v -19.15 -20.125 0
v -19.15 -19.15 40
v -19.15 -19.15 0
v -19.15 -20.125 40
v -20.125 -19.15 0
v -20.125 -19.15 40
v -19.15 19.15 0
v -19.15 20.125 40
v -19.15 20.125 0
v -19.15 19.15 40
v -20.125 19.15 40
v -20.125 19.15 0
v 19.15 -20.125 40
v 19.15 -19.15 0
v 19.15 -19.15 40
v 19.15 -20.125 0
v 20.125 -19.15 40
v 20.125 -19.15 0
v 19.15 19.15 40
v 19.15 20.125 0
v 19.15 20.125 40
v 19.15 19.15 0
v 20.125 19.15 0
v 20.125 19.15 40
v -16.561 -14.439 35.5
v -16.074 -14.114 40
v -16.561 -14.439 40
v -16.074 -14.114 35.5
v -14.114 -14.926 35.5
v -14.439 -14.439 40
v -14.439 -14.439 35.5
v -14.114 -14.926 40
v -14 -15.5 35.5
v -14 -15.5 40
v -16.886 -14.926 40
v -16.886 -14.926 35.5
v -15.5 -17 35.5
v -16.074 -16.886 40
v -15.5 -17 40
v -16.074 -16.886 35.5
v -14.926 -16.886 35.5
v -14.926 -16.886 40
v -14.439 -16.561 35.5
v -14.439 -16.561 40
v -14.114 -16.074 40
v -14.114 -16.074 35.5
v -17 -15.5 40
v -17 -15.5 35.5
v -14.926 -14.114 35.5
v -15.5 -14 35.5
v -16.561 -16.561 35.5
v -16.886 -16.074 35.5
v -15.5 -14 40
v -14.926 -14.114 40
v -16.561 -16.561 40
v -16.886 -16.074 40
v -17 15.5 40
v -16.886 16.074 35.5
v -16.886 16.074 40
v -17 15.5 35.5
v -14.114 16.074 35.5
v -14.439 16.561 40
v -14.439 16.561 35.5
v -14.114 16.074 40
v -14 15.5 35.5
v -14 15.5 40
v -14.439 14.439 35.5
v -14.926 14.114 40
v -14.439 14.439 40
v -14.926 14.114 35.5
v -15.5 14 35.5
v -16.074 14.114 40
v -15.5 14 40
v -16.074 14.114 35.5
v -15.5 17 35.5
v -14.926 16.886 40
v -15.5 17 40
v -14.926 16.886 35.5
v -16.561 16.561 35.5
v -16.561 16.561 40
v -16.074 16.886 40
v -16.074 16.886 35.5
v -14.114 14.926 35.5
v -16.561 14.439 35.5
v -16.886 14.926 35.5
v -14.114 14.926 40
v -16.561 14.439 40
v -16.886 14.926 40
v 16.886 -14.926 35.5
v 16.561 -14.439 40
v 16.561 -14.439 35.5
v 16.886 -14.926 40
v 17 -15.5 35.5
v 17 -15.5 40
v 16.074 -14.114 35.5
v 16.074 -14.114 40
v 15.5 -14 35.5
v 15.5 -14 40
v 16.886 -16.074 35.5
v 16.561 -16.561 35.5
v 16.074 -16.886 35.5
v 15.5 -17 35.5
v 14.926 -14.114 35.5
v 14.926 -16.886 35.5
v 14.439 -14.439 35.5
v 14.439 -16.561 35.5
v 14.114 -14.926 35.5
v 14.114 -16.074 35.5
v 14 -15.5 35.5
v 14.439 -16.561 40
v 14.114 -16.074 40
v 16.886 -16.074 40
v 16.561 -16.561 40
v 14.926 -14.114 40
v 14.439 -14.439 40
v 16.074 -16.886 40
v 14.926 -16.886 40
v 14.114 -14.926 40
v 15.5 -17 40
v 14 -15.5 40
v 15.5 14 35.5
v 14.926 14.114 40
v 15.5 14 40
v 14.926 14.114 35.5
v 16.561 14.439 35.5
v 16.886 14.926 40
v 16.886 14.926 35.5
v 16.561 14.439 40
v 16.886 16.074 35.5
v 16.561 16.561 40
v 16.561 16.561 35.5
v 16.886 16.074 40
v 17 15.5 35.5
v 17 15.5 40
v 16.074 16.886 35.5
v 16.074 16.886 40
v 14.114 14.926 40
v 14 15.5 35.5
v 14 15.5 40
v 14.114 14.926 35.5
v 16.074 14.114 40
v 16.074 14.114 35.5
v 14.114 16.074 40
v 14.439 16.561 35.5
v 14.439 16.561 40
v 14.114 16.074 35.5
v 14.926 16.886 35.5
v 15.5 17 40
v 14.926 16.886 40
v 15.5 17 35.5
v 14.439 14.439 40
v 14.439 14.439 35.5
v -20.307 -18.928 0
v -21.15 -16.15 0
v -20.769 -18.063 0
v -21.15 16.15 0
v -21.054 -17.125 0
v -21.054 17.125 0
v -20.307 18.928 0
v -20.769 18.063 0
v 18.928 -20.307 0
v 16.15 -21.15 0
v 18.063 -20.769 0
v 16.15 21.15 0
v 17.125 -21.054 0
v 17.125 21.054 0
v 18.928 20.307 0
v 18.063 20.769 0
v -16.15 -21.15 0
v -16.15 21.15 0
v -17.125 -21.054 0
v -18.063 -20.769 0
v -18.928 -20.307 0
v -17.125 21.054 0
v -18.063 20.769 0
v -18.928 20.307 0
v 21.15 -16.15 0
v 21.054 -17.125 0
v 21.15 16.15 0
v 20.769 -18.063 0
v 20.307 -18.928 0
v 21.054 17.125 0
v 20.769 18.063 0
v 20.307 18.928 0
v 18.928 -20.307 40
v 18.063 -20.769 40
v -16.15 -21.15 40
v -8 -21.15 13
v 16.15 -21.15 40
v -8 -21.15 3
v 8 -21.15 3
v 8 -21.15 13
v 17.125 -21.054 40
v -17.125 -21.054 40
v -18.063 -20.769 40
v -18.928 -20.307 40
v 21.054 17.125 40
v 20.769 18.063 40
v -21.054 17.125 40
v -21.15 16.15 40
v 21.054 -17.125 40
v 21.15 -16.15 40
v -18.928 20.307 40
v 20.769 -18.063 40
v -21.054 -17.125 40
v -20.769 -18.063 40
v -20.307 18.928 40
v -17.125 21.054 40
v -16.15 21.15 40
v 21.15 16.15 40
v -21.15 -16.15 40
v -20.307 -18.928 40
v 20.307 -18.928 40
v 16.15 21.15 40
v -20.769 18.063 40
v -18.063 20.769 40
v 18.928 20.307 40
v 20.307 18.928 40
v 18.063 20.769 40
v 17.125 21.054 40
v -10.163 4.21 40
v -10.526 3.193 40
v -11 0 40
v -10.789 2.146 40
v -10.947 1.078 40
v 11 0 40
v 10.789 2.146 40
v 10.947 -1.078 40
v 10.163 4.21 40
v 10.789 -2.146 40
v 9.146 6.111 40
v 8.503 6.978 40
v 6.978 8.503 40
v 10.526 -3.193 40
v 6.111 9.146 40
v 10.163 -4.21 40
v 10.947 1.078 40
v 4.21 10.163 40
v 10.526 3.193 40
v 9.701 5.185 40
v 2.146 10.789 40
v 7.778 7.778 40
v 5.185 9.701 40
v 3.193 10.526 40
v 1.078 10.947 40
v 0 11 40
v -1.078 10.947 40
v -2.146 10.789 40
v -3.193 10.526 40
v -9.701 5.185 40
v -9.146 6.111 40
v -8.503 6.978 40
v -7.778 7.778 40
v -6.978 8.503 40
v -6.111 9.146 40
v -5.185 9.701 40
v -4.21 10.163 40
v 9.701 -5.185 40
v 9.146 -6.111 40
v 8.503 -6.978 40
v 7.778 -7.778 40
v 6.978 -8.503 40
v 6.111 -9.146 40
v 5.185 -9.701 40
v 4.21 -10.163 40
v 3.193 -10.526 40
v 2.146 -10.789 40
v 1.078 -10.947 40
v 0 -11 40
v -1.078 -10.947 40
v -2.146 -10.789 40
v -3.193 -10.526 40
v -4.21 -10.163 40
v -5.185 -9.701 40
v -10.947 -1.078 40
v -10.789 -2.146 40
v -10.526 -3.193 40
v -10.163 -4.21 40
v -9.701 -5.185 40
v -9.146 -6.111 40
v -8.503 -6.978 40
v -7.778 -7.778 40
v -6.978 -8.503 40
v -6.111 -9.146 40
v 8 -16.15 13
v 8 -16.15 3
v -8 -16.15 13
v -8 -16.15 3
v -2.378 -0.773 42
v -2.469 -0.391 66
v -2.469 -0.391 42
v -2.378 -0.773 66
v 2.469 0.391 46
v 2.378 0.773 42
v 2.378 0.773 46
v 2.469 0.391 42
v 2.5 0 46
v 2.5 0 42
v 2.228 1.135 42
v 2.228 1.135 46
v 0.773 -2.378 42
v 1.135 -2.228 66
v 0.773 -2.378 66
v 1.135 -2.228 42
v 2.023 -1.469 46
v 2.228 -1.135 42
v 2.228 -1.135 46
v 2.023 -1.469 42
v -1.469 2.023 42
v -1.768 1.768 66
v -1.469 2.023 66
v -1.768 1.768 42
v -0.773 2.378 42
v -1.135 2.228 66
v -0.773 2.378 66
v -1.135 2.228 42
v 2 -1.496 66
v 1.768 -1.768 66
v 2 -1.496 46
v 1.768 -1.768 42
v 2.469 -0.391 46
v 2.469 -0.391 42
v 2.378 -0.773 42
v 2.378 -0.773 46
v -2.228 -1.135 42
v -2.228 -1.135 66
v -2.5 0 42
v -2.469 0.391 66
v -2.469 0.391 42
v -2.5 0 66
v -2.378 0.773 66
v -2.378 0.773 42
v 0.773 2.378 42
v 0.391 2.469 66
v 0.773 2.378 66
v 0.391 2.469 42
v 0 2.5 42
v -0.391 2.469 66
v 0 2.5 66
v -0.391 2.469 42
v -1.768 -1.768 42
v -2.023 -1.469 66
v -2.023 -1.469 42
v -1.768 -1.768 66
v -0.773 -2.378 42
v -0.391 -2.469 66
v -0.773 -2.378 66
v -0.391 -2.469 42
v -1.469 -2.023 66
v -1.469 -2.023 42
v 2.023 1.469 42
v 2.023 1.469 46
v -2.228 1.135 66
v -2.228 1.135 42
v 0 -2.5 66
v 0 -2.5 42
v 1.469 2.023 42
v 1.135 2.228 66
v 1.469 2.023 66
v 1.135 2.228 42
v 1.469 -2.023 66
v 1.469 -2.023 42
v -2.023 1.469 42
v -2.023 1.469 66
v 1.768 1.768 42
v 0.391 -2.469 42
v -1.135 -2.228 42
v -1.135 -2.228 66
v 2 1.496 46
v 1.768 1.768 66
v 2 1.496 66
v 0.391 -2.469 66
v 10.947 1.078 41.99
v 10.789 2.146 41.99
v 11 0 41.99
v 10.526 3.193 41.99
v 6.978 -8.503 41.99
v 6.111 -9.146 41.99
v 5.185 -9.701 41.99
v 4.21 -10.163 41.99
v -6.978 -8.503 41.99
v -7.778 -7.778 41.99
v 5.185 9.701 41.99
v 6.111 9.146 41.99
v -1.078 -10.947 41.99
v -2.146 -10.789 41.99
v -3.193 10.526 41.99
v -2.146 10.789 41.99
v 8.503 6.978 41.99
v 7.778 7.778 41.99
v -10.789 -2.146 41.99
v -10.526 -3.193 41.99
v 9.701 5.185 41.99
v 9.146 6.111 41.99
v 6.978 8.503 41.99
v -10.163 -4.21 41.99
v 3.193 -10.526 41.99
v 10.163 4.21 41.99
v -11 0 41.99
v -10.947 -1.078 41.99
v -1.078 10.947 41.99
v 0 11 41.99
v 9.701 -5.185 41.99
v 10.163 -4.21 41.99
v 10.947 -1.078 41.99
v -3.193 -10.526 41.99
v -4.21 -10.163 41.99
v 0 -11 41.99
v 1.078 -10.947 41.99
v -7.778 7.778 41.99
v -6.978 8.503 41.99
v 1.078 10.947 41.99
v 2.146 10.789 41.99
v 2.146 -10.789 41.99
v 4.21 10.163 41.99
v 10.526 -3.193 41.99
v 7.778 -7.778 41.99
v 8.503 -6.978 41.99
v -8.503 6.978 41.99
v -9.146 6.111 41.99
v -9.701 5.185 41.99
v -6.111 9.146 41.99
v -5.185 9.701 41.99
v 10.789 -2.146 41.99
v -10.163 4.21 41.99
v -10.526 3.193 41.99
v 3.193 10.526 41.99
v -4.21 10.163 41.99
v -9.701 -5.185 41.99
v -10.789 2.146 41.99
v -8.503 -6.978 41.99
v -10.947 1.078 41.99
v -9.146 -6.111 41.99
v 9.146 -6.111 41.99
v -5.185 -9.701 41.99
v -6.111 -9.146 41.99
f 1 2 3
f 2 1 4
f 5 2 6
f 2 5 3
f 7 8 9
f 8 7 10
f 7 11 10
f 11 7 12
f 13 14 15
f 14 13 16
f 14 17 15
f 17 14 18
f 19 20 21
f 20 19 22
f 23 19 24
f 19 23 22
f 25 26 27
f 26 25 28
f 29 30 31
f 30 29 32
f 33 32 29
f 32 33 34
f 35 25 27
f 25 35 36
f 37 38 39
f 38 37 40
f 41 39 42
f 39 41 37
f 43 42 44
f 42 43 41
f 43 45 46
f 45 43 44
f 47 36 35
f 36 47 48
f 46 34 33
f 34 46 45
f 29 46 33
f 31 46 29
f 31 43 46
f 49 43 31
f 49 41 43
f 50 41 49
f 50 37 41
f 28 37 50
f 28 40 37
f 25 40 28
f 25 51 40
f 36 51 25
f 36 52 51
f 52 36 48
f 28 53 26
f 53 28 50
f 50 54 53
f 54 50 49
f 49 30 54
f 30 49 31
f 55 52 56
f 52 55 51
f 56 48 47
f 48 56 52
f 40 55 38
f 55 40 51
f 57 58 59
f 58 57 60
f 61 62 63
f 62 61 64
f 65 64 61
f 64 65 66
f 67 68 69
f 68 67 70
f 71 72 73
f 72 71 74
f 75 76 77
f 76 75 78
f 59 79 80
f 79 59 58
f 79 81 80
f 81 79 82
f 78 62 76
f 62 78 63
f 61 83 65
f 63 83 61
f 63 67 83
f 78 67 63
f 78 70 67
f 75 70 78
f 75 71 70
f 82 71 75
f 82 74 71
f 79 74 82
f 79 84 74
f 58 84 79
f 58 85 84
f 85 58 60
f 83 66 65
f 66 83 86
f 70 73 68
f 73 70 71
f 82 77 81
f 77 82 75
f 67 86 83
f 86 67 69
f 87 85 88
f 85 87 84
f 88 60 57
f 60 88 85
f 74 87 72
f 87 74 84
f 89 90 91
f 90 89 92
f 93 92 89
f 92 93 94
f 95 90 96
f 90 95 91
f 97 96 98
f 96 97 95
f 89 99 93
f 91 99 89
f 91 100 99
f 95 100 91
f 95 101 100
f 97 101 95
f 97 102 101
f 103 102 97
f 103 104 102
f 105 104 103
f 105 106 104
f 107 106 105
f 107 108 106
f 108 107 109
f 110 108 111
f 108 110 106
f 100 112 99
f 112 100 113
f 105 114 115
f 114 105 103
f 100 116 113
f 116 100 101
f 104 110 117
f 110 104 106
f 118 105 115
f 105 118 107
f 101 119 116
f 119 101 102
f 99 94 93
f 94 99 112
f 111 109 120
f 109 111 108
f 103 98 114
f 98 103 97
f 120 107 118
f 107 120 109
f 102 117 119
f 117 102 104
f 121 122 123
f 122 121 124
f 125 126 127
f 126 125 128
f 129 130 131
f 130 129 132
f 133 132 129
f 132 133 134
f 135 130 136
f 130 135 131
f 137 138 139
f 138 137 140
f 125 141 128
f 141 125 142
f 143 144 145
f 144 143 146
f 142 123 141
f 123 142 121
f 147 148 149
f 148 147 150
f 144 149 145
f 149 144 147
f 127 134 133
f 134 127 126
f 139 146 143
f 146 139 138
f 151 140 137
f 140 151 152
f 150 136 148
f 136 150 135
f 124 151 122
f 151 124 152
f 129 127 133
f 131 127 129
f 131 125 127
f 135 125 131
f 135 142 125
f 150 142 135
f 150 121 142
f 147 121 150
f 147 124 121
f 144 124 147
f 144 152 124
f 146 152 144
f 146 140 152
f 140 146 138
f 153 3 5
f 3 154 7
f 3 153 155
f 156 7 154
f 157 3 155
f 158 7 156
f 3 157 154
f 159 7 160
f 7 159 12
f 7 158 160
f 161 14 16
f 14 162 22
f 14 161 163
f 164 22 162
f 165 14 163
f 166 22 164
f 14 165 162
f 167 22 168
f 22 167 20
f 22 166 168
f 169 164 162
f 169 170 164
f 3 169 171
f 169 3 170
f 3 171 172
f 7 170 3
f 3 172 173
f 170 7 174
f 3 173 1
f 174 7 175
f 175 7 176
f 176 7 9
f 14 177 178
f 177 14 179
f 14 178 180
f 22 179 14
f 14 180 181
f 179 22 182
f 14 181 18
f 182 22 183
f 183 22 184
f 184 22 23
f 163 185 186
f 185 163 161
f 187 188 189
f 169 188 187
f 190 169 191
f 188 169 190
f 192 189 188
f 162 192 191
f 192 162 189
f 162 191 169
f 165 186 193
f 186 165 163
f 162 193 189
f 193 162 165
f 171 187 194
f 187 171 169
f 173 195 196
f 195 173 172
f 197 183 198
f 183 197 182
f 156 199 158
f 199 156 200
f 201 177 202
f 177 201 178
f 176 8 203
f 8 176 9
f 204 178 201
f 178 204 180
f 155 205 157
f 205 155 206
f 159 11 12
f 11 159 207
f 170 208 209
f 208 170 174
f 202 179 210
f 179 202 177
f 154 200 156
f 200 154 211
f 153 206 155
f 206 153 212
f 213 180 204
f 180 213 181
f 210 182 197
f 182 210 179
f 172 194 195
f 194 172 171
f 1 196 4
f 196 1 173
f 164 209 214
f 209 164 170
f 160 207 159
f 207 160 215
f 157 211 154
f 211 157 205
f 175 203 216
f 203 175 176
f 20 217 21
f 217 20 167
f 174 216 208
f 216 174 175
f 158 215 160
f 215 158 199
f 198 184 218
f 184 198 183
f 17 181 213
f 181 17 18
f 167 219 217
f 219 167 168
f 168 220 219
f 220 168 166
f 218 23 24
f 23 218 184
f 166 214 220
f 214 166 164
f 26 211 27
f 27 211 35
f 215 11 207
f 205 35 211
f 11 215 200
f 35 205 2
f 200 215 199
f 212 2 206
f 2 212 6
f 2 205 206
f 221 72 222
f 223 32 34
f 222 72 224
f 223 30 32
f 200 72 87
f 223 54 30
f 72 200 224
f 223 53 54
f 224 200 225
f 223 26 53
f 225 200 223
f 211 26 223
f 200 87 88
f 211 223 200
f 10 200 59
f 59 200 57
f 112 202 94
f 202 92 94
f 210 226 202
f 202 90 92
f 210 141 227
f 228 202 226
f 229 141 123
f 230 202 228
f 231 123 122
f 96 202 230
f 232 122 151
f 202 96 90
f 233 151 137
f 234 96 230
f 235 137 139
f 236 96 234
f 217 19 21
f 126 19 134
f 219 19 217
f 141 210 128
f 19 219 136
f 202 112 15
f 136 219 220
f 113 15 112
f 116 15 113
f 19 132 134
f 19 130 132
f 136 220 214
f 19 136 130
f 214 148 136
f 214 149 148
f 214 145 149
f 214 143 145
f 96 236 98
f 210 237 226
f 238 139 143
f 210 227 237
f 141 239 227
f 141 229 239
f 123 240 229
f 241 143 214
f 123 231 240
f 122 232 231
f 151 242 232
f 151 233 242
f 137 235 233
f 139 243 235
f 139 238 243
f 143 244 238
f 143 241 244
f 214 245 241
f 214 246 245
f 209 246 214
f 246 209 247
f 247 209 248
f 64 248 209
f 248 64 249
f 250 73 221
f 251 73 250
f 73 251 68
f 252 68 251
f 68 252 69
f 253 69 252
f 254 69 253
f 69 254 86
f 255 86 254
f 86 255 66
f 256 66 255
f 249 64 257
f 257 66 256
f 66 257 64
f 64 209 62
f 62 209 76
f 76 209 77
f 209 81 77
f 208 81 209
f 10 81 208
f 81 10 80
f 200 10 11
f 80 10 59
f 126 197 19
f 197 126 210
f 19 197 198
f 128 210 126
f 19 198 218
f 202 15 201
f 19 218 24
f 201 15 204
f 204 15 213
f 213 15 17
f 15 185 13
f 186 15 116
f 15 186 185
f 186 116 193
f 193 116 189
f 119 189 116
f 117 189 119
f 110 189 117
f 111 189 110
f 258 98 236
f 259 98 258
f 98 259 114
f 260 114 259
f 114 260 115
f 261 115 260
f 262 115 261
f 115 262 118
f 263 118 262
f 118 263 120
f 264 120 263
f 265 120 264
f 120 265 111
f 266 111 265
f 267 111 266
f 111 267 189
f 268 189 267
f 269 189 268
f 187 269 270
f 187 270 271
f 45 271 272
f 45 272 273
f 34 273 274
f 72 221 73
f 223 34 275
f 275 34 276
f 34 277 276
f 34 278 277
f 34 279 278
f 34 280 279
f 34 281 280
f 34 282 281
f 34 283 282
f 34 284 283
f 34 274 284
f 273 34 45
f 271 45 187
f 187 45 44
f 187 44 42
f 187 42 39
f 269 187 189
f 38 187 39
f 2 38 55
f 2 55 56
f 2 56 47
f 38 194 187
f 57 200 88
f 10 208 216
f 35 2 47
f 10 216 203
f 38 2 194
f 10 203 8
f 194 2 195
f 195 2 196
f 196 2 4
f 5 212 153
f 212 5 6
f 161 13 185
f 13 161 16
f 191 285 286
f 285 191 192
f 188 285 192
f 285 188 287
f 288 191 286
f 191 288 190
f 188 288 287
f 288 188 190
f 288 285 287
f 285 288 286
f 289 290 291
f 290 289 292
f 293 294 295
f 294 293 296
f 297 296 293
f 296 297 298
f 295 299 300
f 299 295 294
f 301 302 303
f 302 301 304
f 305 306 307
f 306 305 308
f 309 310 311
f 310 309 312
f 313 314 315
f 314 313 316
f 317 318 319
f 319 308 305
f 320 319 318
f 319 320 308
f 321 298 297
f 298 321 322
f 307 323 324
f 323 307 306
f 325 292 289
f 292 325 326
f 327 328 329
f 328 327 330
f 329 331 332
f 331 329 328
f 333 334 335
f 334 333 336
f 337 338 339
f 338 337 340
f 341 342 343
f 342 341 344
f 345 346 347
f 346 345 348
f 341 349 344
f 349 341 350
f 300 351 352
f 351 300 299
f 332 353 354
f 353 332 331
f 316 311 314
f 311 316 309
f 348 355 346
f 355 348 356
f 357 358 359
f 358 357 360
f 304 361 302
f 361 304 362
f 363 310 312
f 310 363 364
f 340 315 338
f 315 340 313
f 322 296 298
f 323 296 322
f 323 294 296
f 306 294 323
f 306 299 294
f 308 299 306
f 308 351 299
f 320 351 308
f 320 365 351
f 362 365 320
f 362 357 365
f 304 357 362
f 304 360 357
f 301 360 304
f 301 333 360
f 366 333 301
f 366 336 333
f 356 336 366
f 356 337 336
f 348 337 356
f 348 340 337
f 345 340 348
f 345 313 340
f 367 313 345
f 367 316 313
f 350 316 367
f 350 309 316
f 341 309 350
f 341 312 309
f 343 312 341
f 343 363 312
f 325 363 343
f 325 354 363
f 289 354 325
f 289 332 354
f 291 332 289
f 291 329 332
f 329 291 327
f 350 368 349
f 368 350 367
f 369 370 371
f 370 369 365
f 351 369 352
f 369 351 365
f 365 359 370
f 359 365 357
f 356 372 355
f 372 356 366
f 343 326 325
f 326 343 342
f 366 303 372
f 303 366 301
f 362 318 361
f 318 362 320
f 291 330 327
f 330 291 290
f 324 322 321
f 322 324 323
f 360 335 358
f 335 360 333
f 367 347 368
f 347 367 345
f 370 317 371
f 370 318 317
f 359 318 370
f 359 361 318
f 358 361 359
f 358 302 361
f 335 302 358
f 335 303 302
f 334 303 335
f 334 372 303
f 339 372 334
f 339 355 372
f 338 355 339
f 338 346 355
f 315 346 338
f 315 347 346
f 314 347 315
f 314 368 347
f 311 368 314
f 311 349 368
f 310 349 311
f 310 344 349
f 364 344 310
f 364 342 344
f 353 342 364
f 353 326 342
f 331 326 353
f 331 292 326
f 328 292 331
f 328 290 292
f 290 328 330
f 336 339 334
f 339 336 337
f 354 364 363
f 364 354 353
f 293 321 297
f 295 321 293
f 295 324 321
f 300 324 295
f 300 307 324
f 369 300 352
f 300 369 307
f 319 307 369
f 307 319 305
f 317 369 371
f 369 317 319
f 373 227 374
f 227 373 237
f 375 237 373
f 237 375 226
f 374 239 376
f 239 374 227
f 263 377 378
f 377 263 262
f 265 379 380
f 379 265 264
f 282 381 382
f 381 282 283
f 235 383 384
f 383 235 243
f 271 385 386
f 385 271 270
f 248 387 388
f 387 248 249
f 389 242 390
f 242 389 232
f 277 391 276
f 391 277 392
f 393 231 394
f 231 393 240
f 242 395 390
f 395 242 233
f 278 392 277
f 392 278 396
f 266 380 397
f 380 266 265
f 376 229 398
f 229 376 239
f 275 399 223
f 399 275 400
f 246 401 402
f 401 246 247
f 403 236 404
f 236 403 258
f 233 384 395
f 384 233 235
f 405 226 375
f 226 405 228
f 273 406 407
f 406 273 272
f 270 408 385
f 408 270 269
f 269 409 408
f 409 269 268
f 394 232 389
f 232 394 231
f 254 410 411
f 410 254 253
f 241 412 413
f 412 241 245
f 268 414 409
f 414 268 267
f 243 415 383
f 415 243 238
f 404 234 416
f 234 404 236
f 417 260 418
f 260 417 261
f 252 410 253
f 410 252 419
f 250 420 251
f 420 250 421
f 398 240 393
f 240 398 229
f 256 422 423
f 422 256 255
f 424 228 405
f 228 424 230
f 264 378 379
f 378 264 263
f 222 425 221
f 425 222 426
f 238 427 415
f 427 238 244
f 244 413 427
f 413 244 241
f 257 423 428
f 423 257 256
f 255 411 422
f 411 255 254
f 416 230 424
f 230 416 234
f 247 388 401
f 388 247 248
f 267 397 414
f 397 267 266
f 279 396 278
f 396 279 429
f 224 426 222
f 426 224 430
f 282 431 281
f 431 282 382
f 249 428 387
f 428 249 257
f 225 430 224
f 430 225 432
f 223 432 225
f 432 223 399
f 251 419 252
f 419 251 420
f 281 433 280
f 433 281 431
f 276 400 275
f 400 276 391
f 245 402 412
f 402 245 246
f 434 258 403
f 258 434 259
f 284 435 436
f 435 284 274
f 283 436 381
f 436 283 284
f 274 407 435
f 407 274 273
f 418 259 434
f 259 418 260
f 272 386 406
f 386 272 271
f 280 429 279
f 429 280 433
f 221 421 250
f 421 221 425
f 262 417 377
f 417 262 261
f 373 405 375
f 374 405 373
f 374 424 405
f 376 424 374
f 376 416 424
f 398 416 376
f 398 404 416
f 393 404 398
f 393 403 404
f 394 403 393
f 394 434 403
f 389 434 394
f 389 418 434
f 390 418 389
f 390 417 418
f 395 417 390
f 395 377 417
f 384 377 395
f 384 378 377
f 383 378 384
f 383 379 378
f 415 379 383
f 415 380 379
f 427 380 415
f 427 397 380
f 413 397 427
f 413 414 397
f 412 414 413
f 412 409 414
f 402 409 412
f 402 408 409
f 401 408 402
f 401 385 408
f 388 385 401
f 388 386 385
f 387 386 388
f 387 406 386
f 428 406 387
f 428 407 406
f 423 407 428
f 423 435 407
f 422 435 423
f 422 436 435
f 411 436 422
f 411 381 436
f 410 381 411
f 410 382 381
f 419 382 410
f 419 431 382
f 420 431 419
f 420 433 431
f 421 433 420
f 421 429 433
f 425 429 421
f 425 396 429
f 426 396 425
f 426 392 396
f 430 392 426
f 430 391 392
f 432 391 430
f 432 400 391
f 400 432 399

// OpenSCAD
// =======================================================================
// REALISTIC NEMA 17 STEPPER MOTOR LIBRARY
// File Name Recommendation: nema17_motor.scad
// =======================================================================

// Example Render Call
// Bottom face sits at Z=0, shaft points straight UP (+Z) for easy local positioning
nema17_stepper(body_length=40, shaft_length=24);


// =======================================================================
// LIBRARY MODULE DEFINITIONS
// =======================================================================

module nema17_stepper(body_length=40, shaft_length=24) {
    // Standard NEMA 17 Dimensions (42.3mm x 42.3mm faceplate)
    width = 42.3;
    corner_radius = 5.0;
    
    color("DarkSlateGray") {
        difference() {
            // 1. MAIN MOTOR BODY
            // Generates a smooth, rounded square body shape
            linear_extrude(height=body_length) {
                offset(r=corner_radius, $fn=32) {
                    square([width - corner_radius*2, width - corner_radius*2], center=true);
                }
            }
            
            // 2. CORNER PROFILE NOTCHES
            // Cuts out the 4 shiny metallic corner steps seen on real steppers
            for(x = [-width/2, width/2]) {
                for(y = [-width/2, width/2]) {
                    translate([x, y, body_length/2])
                        cube([4, 4, body_length + 2], center=true);
                }
            }
            
            // 3. FRONT FACE M3 MOUNTING THREADS (31mm x 31mm square spacing)
            for(x = [-15.5, 15.5]) {
                for(y = [-15.5, 15.5]) {
                    translate([x, y, body_length - 4.5])
                        cylinder(d=3, h=5, $fn=16);
                }
            }
            
            // 4. REAR JST ELECTRICAL PLUG PORT
            translate([0, -width/2 + 2, 8])
                cube([16, 6, 10], center=true);
        }
    }
    
    // 5. METALLIC FRONT REGISTRATION BOSS (22mm standard diameter locator ring)
    color("silver") 
        translate([0, 0, body_length - 0.01])
            cylinder(d=22, h=2, $fn=64);
            
    // 6. PRECISION STEEL D-PROFILE DRIVE SHAFT
    color("lightgray") {
        translate([0, 0, body_length + 2]) {
            difference() {
                // Main 5mm diameter steel shaft cylinder
                cylinder(d=5, h=shaft_length, $fn=40);
                
                // Flat D-cut slice (Shaves off 0.5mm from the side, starting 4mm up from the base)
                translate([2, -5, 4])
                    cube([5, 10, shaft_length + 1]);
            }
        }
    }
}
